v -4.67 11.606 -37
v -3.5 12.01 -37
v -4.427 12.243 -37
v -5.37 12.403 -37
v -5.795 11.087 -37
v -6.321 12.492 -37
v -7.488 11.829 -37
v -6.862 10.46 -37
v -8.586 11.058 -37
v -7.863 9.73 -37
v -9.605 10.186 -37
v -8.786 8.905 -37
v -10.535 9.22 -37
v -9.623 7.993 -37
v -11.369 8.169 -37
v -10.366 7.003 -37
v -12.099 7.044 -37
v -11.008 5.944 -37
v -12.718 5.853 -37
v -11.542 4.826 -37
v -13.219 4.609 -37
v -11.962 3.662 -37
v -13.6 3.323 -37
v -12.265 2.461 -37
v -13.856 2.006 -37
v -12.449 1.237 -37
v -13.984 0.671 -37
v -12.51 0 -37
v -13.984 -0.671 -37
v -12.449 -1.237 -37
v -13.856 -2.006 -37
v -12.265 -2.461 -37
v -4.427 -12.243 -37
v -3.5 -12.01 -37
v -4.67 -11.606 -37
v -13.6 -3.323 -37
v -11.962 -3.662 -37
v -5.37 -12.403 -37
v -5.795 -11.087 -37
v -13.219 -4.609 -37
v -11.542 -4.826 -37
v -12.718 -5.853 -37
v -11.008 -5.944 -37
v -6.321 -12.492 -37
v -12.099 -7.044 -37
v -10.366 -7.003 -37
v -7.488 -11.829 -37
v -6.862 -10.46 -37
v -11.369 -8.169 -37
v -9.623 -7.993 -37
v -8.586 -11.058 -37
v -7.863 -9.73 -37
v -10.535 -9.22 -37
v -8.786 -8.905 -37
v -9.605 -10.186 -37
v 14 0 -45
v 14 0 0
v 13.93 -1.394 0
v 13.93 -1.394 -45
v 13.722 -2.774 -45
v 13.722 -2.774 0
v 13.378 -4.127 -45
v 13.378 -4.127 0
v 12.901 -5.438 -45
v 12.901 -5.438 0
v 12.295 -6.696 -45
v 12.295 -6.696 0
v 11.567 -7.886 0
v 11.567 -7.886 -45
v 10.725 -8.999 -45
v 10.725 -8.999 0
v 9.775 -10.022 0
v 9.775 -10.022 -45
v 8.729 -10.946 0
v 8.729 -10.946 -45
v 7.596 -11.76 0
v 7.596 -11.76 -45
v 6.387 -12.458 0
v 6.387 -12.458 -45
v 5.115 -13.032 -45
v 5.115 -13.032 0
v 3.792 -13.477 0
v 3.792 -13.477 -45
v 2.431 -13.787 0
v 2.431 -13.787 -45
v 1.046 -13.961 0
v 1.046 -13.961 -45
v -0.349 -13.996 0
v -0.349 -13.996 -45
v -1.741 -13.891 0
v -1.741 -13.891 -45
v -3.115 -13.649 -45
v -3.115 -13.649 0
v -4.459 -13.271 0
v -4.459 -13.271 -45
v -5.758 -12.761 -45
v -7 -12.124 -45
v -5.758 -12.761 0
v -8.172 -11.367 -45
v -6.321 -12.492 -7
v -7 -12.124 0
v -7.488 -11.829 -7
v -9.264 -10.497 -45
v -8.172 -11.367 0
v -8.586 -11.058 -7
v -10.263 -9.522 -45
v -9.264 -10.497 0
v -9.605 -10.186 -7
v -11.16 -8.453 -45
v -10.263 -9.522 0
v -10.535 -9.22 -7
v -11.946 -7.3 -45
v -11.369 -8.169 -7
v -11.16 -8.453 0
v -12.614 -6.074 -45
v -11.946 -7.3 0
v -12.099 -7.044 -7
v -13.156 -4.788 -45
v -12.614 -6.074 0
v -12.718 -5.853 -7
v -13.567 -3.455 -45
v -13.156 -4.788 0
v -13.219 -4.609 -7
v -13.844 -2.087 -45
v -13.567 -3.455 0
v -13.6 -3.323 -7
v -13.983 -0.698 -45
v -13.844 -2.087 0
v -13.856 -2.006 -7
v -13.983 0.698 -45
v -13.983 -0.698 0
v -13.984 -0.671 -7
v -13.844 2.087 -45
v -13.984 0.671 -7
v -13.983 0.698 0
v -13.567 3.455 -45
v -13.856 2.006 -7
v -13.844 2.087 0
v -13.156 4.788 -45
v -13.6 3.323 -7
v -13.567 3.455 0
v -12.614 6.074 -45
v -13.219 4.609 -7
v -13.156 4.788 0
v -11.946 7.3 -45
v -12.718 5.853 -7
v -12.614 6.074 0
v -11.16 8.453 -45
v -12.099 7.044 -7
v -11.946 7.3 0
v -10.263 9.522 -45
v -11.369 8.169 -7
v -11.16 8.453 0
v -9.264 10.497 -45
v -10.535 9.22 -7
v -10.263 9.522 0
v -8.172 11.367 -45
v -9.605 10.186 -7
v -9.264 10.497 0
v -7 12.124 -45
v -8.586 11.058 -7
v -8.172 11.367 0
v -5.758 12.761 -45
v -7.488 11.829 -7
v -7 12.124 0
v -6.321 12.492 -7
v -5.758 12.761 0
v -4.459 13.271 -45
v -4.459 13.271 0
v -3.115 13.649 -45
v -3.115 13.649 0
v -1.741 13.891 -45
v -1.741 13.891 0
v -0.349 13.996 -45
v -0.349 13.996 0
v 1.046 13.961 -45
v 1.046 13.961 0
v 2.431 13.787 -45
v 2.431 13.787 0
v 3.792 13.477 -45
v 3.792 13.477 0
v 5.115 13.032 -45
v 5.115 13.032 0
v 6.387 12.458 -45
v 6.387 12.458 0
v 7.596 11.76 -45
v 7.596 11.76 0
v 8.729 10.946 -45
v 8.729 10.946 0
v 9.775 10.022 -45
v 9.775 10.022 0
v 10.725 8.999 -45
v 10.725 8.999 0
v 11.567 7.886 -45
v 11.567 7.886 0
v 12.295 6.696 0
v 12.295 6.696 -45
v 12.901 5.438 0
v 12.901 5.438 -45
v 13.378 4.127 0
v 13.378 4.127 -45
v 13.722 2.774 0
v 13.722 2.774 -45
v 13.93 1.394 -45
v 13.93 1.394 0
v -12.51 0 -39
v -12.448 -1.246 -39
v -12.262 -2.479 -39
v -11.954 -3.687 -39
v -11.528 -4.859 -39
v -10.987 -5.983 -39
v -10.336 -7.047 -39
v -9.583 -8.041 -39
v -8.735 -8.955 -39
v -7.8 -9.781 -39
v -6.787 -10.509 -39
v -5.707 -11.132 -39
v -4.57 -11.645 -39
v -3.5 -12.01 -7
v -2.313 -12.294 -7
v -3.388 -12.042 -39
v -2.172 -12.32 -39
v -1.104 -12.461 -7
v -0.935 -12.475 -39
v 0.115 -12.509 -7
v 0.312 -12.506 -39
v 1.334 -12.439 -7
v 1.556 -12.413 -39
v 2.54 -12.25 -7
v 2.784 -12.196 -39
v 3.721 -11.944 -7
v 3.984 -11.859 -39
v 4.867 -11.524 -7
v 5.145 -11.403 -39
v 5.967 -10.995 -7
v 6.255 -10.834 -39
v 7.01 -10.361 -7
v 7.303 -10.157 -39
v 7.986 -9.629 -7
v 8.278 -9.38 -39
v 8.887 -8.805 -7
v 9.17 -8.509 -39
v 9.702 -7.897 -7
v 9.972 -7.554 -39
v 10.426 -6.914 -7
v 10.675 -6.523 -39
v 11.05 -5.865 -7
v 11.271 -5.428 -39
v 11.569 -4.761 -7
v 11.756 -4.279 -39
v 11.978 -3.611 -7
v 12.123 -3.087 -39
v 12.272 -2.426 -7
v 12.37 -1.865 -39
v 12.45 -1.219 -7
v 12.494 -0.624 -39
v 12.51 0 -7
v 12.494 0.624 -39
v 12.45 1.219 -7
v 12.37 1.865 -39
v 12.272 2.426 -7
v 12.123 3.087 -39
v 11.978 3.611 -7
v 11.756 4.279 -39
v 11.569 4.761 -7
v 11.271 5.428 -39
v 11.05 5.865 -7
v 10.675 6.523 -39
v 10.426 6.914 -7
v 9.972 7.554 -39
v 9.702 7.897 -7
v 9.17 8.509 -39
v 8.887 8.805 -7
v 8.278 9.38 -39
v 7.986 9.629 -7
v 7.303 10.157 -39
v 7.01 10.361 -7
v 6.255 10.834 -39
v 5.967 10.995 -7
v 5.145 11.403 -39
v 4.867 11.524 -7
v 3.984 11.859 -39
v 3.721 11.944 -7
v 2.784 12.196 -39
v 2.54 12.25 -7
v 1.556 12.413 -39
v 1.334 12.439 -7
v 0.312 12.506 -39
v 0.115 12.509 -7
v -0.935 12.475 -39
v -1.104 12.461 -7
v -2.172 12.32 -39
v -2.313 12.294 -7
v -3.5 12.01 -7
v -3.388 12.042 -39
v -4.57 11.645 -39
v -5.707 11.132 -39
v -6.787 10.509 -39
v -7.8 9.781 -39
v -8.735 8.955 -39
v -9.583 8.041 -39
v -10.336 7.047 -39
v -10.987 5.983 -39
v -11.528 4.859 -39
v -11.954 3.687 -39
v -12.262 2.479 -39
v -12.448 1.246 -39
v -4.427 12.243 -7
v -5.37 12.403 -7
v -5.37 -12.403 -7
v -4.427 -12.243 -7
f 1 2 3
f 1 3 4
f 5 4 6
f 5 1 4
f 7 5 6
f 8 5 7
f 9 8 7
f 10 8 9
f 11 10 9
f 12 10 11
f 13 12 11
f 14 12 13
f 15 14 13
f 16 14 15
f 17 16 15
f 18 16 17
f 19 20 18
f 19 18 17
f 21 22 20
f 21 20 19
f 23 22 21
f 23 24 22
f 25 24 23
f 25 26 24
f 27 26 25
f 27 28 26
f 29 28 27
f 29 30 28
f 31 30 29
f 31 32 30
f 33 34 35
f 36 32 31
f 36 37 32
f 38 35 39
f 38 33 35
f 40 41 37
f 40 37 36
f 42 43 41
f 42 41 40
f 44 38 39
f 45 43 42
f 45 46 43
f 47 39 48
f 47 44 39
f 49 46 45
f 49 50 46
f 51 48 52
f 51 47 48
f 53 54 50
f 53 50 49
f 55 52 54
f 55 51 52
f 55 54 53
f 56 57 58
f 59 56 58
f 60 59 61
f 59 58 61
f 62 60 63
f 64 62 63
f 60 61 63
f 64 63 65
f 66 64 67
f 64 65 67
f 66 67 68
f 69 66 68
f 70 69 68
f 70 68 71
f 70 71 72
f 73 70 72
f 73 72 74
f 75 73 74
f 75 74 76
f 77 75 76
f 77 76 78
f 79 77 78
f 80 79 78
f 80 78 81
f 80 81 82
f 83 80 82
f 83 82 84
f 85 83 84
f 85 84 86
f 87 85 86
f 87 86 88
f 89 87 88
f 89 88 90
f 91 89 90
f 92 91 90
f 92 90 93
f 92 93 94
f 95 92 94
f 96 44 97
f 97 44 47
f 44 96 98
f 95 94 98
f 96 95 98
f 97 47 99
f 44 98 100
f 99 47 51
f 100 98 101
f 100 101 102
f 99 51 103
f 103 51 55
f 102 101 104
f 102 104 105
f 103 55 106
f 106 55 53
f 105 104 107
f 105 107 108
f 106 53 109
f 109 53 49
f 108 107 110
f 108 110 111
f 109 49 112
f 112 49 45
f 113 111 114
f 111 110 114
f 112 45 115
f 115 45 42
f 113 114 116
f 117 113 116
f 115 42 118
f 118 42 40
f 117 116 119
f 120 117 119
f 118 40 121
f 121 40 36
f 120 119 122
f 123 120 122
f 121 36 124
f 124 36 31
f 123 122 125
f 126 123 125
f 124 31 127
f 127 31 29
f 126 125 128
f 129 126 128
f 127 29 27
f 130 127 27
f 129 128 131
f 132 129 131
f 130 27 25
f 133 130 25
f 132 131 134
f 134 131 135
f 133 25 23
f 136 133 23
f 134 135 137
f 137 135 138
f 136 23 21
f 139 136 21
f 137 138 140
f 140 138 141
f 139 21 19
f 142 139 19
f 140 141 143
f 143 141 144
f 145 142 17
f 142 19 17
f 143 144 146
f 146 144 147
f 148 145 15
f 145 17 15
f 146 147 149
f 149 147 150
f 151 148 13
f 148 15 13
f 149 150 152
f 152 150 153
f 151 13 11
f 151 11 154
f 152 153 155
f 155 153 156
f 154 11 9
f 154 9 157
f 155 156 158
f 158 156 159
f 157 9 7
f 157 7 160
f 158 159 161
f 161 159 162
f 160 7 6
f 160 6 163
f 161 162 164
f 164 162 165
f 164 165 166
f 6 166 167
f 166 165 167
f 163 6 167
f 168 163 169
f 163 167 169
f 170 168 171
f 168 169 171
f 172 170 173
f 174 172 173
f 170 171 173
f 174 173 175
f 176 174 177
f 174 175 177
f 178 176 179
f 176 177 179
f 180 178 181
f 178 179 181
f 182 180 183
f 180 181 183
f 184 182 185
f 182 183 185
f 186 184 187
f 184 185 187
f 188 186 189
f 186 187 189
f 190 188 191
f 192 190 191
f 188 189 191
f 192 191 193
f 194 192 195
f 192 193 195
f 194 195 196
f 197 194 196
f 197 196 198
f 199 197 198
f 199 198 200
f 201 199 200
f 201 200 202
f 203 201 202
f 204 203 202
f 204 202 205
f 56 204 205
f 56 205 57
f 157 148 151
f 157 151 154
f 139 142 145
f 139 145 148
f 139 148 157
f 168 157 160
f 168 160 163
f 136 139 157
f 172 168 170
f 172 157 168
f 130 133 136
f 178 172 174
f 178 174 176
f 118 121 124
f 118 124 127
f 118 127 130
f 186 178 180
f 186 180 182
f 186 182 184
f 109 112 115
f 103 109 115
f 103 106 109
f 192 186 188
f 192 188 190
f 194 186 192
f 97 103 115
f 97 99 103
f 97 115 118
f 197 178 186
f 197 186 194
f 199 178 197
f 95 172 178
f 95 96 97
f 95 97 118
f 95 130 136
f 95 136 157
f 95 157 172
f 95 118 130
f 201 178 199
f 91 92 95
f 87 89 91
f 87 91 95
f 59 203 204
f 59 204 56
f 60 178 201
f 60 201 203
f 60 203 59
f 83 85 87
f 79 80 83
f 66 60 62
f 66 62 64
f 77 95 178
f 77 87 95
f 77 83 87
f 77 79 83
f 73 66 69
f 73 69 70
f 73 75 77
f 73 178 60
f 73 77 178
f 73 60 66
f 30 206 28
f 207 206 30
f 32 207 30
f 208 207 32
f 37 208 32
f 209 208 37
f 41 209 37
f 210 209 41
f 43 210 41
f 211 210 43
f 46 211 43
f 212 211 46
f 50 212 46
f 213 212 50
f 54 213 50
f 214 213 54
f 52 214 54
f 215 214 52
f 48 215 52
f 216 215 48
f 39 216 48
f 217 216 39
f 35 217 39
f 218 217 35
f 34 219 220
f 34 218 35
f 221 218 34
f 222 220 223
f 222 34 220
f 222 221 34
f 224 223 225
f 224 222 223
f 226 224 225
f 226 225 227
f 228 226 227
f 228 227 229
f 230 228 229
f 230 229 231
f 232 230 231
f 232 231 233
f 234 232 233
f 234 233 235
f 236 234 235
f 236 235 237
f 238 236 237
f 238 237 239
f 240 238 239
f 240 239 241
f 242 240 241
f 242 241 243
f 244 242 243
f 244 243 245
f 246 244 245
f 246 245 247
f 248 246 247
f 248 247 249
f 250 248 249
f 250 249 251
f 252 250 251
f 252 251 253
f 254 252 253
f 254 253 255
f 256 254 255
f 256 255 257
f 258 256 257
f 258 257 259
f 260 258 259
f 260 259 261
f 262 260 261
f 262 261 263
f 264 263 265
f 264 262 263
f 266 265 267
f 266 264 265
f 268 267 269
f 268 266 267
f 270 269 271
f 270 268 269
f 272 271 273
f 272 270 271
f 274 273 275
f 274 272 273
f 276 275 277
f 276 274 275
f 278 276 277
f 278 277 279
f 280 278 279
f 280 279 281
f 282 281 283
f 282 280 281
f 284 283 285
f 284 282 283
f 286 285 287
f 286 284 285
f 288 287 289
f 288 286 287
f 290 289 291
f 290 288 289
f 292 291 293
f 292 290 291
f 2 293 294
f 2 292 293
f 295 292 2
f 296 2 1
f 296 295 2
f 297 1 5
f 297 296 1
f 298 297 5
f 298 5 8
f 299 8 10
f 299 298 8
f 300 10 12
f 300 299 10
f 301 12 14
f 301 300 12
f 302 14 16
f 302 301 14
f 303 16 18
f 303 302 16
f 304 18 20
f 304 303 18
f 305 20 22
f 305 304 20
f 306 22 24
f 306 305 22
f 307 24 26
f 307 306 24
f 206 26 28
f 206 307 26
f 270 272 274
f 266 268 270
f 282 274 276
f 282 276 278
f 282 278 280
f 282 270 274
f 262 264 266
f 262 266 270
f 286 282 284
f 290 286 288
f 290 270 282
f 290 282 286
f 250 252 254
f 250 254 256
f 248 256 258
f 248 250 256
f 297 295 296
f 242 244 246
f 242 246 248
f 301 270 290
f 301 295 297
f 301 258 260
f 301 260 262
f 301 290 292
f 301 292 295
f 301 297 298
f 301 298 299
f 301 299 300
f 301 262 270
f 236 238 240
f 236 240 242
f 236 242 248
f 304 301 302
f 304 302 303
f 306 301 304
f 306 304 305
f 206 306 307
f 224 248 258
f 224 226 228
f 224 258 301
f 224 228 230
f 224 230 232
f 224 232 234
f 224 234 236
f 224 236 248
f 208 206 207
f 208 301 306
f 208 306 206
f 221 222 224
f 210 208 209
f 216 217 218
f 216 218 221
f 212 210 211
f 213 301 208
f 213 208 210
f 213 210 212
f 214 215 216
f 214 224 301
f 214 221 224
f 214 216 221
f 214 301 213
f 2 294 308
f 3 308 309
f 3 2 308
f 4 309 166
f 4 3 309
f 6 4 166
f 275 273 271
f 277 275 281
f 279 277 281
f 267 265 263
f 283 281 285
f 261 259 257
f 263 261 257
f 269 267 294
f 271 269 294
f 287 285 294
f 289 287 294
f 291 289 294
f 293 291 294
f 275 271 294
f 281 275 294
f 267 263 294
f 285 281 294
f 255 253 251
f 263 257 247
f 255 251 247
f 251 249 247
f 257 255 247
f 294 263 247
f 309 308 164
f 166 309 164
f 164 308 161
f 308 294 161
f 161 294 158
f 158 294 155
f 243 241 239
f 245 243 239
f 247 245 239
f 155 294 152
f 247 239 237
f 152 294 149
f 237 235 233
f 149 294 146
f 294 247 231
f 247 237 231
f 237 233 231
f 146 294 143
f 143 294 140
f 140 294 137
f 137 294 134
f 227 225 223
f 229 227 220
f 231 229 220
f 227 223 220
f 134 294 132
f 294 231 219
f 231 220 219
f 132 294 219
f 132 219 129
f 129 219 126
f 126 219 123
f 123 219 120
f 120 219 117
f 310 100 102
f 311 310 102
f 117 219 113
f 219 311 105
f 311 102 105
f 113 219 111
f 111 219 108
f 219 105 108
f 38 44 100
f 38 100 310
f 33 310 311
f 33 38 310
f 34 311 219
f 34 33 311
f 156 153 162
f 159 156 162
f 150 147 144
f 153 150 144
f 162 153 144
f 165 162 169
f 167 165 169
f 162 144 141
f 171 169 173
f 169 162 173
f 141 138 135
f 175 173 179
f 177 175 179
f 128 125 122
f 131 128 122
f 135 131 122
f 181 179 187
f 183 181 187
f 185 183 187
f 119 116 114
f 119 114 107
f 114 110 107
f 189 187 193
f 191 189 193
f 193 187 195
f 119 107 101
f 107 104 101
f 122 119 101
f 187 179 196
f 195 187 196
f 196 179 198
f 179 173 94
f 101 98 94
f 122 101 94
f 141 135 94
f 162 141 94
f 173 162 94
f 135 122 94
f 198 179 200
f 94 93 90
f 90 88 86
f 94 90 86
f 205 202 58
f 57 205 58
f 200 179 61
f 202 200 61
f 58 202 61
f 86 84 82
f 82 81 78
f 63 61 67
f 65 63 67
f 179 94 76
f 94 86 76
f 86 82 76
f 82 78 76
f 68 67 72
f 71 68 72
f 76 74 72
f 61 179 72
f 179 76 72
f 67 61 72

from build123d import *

# Parameters (mm, degrees)
CYLINDER003_R     = 12.51
CYLINDER003_DEPTH = 30
CYLINDER002_R     = 12.51
CYLINDER002_DEPTH = 32
CYLINDER001_R     = 14
CYLINDER001_DEPTH = 45


with BuildPart() as cylinder003:
    # Cylinder003 → Cylinder003 (new body)
    with BuildSketch(Plane(origin=(-7, 0, -37), x_dir=(-1, 0, 0), z_dir=(0, 0, 1))):
        Circle(CYLINDER003_R)
    extrude(amount=CYLINDER003_DEPTH)


with BuildPart() as cylinder002:
    # Cylinder002 → Cylinder002 (new body)
    with BuildSketch(Plane(origin=(0, 0, -39), x_dir=(-1, 0, 0), z_dir=(0, 0, 1))):
        Circle(CYLINDER002_R)
    extrude(amount=CYLINDER002_DEPTH)


with BuildPart() as cut001:
    # Cylinder001 → Cylinder001 (new body)
    with BuildSketch(Plane(origin=(0, 0, 0), x_dir=(1, 0, 0), z_dir=(0, 0, -1))):
        Circle(CYLINDER001_R)
    extrude(amount=CYLINDER001_DEPTH)

    # Cut: cut Cylinder002
    add(cylinder002.part, mode=Mode.SUBTRACT)

    # Cut001: cut Cylinder003
    add(cylinder003.part, mode=Mode.SUBTRACT)


solid = cut001.part
